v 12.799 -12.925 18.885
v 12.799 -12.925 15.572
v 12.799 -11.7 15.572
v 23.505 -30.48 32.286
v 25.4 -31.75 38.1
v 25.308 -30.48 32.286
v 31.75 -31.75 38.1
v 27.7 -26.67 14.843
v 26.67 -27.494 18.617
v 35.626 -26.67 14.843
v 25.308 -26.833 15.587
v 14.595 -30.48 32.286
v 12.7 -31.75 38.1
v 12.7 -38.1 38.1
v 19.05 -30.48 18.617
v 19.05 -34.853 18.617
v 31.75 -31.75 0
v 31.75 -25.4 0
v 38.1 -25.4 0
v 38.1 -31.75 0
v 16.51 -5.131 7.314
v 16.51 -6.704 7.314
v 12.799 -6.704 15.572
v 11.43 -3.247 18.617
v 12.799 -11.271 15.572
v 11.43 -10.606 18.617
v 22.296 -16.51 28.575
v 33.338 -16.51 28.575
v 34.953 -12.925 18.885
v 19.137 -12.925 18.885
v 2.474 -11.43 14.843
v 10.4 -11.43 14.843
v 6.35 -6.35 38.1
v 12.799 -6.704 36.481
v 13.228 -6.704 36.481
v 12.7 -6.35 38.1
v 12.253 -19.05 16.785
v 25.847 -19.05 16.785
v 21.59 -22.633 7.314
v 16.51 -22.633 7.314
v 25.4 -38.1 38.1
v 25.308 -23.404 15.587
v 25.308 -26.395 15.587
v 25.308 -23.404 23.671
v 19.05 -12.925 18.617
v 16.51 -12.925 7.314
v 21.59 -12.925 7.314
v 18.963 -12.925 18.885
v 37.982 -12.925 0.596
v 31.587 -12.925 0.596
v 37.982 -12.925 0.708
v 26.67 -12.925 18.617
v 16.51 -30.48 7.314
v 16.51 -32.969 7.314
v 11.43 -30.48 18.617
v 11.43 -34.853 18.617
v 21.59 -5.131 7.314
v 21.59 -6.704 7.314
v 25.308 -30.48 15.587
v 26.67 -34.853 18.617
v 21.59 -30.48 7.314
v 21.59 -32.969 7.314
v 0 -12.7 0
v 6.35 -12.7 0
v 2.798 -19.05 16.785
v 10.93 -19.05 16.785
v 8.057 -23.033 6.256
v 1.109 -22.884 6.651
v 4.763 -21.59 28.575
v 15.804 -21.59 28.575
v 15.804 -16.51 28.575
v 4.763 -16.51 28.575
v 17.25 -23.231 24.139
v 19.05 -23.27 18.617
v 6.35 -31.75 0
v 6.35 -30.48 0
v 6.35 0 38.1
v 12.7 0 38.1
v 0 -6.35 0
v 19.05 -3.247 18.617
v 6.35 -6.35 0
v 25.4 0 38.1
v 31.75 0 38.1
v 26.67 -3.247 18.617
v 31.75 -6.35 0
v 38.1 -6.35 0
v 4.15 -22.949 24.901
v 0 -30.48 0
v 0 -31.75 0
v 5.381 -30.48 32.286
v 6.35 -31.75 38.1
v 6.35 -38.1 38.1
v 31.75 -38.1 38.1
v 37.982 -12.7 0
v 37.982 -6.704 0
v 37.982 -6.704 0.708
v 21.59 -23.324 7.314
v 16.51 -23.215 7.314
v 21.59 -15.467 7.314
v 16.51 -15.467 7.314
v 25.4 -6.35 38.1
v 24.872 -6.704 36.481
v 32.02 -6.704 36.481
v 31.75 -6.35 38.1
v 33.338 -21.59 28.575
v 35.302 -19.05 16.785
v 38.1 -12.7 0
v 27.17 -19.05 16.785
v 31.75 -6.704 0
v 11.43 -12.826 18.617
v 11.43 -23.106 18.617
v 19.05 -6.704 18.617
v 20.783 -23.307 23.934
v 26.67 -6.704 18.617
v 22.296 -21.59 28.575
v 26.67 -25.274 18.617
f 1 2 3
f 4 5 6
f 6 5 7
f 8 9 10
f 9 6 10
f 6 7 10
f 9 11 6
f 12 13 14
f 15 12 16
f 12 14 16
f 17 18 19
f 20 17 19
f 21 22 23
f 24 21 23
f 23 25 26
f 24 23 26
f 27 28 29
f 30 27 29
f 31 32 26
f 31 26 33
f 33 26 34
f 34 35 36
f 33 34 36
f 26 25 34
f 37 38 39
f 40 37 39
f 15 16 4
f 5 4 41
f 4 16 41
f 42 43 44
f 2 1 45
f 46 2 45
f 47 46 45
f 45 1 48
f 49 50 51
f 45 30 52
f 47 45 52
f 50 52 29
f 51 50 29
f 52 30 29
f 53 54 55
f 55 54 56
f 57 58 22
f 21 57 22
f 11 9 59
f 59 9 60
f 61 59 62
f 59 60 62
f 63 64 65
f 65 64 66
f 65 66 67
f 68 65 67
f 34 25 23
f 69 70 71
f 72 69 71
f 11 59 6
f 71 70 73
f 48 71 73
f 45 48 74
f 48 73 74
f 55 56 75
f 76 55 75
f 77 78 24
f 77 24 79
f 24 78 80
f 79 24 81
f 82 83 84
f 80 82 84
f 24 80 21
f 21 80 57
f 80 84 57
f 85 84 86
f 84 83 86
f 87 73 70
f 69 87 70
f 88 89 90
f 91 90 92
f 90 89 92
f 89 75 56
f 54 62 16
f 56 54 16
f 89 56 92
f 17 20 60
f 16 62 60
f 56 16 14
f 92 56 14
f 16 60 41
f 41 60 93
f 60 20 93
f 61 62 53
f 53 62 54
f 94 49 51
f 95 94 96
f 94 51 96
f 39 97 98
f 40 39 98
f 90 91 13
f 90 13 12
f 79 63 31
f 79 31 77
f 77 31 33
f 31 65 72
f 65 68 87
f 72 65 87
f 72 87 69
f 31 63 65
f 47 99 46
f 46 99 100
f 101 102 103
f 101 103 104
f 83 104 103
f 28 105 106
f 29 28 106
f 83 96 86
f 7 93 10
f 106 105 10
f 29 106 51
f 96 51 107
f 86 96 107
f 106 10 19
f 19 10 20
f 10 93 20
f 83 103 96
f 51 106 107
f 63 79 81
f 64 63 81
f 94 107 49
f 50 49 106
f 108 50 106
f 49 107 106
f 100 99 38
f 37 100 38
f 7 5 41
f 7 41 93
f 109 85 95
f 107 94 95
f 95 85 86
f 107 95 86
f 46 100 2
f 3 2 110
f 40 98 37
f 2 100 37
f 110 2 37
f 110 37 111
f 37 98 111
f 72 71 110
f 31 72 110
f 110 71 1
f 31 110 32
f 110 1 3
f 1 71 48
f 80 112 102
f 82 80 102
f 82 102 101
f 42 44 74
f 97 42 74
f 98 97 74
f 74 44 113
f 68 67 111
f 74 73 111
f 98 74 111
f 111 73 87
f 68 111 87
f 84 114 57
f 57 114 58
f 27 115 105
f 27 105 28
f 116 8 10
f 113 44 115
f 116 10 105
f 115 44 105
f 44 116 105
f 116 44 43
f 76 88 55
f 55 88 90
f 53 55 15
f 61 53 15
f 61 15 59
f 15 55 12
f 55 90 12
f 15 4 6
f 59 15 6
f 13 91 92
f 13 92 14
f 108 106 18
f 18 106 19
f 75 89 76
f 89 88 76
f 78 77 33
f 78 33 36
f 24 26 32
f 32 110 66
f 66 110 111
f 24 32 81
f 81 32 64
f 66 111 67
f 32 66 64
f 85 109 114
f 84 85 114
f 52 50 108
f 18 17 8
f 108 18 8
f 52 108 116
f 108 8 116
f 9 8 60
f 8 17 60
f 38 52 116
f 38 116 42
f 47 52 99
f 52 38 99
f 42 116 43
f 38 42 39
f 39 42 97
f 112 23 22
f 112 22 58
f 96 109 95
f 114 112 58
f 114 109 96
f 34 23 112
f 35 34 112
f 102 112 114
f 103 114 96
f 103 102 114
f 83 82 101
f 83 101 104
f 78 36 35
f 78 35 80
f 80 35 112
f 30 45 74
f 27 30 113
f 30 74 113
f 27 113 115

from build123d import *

# Parameters (mm, degrees)
F0_W      = 38.1
F0_H      = 38.1
F1_DEPTH  = 38.1
F6_DEPTH  = 38.1
F8_DEPTH  = 38.1
F10_DEPTH = 38.1
F11_W     = 25.183282
F11_H     = 6.221752
F12_DEPTH = 38.1


with BuildPart() as f1:
    # F0 (on Front) → F1 (new body)
    with BuildSketch(Plane.XZ):
        with Locations((19.05, 19.05)):
            Rectangle(F0_W, F0_H)
    extrude(amount=F1_DEPTH)

    # F5 (on offset) → F6 (cut)
    with BuildSketch(Plane.YZ.offset(38.1)):
        Polygon((-6.35, 38.1), (-31.75, 38.1), (-26.67, 14.842794), (-21.59, 28.575), (-16.51, 28.575), (-11.43, 14.842794), align=None)
        Polygon((-38.1, 38.1), (-38.1, 0), (-31.75, 0), align=None)
        Polygon((-19.05, 16.785284), (-25.4, 0), (-12.7, 0), align=None)
        Polygon((0, 38.1), (-6.35, 0), (0, 0), align=None)
    extrude(amount=-F6_DEPTH, mode=Mode.SUBTRACT)

    # F7 (on offset) → F8 (cut)
    with BuildSketch(Plane.XZ.offset(38.1)):
        Polygon((25.4, 38.1), (12.7, 38.1), (19.05, 18.617285), align=None)
        Polygon((0, 38.1), (0, 0), (6.35, 38.1), align=None)
        Polygon((11.43, 18.617285), (6.35, 0), (31.75, 0), (26.67, 18.617285), (21.59, 7.313934), (16.51, 7.313934), align=None)
        Polygon((31.75, 38.1), (38.1, 0), (38.1, 38.1), align=None)
    extrude(amount=-F8_DEPTH, mode=Mode.SUBTRACT)

    # F9 (on offset) → F10 (cut)
    with BuildSketch(Plane.XY.offset(38.1)):
        Polygon((25.308223, -23.404286), (0, -22.86), (0, -30.48), (25.308223, -30.48), align=None)
    extrude(amount=-F10_DEPTH, mode=Mode.SUBTRACT)

    # F11 (on offset) → F12 (cut)
    with BuildSketch(Plane.XY.offset(38.1)):
        with Locations((25.390372, -9.81442)):
            Rectangle(F11_W, F11_H)
    extrude(amount=-F12_DEPTH, mode=Mode.SUBTRACT)


solid = f1.part
